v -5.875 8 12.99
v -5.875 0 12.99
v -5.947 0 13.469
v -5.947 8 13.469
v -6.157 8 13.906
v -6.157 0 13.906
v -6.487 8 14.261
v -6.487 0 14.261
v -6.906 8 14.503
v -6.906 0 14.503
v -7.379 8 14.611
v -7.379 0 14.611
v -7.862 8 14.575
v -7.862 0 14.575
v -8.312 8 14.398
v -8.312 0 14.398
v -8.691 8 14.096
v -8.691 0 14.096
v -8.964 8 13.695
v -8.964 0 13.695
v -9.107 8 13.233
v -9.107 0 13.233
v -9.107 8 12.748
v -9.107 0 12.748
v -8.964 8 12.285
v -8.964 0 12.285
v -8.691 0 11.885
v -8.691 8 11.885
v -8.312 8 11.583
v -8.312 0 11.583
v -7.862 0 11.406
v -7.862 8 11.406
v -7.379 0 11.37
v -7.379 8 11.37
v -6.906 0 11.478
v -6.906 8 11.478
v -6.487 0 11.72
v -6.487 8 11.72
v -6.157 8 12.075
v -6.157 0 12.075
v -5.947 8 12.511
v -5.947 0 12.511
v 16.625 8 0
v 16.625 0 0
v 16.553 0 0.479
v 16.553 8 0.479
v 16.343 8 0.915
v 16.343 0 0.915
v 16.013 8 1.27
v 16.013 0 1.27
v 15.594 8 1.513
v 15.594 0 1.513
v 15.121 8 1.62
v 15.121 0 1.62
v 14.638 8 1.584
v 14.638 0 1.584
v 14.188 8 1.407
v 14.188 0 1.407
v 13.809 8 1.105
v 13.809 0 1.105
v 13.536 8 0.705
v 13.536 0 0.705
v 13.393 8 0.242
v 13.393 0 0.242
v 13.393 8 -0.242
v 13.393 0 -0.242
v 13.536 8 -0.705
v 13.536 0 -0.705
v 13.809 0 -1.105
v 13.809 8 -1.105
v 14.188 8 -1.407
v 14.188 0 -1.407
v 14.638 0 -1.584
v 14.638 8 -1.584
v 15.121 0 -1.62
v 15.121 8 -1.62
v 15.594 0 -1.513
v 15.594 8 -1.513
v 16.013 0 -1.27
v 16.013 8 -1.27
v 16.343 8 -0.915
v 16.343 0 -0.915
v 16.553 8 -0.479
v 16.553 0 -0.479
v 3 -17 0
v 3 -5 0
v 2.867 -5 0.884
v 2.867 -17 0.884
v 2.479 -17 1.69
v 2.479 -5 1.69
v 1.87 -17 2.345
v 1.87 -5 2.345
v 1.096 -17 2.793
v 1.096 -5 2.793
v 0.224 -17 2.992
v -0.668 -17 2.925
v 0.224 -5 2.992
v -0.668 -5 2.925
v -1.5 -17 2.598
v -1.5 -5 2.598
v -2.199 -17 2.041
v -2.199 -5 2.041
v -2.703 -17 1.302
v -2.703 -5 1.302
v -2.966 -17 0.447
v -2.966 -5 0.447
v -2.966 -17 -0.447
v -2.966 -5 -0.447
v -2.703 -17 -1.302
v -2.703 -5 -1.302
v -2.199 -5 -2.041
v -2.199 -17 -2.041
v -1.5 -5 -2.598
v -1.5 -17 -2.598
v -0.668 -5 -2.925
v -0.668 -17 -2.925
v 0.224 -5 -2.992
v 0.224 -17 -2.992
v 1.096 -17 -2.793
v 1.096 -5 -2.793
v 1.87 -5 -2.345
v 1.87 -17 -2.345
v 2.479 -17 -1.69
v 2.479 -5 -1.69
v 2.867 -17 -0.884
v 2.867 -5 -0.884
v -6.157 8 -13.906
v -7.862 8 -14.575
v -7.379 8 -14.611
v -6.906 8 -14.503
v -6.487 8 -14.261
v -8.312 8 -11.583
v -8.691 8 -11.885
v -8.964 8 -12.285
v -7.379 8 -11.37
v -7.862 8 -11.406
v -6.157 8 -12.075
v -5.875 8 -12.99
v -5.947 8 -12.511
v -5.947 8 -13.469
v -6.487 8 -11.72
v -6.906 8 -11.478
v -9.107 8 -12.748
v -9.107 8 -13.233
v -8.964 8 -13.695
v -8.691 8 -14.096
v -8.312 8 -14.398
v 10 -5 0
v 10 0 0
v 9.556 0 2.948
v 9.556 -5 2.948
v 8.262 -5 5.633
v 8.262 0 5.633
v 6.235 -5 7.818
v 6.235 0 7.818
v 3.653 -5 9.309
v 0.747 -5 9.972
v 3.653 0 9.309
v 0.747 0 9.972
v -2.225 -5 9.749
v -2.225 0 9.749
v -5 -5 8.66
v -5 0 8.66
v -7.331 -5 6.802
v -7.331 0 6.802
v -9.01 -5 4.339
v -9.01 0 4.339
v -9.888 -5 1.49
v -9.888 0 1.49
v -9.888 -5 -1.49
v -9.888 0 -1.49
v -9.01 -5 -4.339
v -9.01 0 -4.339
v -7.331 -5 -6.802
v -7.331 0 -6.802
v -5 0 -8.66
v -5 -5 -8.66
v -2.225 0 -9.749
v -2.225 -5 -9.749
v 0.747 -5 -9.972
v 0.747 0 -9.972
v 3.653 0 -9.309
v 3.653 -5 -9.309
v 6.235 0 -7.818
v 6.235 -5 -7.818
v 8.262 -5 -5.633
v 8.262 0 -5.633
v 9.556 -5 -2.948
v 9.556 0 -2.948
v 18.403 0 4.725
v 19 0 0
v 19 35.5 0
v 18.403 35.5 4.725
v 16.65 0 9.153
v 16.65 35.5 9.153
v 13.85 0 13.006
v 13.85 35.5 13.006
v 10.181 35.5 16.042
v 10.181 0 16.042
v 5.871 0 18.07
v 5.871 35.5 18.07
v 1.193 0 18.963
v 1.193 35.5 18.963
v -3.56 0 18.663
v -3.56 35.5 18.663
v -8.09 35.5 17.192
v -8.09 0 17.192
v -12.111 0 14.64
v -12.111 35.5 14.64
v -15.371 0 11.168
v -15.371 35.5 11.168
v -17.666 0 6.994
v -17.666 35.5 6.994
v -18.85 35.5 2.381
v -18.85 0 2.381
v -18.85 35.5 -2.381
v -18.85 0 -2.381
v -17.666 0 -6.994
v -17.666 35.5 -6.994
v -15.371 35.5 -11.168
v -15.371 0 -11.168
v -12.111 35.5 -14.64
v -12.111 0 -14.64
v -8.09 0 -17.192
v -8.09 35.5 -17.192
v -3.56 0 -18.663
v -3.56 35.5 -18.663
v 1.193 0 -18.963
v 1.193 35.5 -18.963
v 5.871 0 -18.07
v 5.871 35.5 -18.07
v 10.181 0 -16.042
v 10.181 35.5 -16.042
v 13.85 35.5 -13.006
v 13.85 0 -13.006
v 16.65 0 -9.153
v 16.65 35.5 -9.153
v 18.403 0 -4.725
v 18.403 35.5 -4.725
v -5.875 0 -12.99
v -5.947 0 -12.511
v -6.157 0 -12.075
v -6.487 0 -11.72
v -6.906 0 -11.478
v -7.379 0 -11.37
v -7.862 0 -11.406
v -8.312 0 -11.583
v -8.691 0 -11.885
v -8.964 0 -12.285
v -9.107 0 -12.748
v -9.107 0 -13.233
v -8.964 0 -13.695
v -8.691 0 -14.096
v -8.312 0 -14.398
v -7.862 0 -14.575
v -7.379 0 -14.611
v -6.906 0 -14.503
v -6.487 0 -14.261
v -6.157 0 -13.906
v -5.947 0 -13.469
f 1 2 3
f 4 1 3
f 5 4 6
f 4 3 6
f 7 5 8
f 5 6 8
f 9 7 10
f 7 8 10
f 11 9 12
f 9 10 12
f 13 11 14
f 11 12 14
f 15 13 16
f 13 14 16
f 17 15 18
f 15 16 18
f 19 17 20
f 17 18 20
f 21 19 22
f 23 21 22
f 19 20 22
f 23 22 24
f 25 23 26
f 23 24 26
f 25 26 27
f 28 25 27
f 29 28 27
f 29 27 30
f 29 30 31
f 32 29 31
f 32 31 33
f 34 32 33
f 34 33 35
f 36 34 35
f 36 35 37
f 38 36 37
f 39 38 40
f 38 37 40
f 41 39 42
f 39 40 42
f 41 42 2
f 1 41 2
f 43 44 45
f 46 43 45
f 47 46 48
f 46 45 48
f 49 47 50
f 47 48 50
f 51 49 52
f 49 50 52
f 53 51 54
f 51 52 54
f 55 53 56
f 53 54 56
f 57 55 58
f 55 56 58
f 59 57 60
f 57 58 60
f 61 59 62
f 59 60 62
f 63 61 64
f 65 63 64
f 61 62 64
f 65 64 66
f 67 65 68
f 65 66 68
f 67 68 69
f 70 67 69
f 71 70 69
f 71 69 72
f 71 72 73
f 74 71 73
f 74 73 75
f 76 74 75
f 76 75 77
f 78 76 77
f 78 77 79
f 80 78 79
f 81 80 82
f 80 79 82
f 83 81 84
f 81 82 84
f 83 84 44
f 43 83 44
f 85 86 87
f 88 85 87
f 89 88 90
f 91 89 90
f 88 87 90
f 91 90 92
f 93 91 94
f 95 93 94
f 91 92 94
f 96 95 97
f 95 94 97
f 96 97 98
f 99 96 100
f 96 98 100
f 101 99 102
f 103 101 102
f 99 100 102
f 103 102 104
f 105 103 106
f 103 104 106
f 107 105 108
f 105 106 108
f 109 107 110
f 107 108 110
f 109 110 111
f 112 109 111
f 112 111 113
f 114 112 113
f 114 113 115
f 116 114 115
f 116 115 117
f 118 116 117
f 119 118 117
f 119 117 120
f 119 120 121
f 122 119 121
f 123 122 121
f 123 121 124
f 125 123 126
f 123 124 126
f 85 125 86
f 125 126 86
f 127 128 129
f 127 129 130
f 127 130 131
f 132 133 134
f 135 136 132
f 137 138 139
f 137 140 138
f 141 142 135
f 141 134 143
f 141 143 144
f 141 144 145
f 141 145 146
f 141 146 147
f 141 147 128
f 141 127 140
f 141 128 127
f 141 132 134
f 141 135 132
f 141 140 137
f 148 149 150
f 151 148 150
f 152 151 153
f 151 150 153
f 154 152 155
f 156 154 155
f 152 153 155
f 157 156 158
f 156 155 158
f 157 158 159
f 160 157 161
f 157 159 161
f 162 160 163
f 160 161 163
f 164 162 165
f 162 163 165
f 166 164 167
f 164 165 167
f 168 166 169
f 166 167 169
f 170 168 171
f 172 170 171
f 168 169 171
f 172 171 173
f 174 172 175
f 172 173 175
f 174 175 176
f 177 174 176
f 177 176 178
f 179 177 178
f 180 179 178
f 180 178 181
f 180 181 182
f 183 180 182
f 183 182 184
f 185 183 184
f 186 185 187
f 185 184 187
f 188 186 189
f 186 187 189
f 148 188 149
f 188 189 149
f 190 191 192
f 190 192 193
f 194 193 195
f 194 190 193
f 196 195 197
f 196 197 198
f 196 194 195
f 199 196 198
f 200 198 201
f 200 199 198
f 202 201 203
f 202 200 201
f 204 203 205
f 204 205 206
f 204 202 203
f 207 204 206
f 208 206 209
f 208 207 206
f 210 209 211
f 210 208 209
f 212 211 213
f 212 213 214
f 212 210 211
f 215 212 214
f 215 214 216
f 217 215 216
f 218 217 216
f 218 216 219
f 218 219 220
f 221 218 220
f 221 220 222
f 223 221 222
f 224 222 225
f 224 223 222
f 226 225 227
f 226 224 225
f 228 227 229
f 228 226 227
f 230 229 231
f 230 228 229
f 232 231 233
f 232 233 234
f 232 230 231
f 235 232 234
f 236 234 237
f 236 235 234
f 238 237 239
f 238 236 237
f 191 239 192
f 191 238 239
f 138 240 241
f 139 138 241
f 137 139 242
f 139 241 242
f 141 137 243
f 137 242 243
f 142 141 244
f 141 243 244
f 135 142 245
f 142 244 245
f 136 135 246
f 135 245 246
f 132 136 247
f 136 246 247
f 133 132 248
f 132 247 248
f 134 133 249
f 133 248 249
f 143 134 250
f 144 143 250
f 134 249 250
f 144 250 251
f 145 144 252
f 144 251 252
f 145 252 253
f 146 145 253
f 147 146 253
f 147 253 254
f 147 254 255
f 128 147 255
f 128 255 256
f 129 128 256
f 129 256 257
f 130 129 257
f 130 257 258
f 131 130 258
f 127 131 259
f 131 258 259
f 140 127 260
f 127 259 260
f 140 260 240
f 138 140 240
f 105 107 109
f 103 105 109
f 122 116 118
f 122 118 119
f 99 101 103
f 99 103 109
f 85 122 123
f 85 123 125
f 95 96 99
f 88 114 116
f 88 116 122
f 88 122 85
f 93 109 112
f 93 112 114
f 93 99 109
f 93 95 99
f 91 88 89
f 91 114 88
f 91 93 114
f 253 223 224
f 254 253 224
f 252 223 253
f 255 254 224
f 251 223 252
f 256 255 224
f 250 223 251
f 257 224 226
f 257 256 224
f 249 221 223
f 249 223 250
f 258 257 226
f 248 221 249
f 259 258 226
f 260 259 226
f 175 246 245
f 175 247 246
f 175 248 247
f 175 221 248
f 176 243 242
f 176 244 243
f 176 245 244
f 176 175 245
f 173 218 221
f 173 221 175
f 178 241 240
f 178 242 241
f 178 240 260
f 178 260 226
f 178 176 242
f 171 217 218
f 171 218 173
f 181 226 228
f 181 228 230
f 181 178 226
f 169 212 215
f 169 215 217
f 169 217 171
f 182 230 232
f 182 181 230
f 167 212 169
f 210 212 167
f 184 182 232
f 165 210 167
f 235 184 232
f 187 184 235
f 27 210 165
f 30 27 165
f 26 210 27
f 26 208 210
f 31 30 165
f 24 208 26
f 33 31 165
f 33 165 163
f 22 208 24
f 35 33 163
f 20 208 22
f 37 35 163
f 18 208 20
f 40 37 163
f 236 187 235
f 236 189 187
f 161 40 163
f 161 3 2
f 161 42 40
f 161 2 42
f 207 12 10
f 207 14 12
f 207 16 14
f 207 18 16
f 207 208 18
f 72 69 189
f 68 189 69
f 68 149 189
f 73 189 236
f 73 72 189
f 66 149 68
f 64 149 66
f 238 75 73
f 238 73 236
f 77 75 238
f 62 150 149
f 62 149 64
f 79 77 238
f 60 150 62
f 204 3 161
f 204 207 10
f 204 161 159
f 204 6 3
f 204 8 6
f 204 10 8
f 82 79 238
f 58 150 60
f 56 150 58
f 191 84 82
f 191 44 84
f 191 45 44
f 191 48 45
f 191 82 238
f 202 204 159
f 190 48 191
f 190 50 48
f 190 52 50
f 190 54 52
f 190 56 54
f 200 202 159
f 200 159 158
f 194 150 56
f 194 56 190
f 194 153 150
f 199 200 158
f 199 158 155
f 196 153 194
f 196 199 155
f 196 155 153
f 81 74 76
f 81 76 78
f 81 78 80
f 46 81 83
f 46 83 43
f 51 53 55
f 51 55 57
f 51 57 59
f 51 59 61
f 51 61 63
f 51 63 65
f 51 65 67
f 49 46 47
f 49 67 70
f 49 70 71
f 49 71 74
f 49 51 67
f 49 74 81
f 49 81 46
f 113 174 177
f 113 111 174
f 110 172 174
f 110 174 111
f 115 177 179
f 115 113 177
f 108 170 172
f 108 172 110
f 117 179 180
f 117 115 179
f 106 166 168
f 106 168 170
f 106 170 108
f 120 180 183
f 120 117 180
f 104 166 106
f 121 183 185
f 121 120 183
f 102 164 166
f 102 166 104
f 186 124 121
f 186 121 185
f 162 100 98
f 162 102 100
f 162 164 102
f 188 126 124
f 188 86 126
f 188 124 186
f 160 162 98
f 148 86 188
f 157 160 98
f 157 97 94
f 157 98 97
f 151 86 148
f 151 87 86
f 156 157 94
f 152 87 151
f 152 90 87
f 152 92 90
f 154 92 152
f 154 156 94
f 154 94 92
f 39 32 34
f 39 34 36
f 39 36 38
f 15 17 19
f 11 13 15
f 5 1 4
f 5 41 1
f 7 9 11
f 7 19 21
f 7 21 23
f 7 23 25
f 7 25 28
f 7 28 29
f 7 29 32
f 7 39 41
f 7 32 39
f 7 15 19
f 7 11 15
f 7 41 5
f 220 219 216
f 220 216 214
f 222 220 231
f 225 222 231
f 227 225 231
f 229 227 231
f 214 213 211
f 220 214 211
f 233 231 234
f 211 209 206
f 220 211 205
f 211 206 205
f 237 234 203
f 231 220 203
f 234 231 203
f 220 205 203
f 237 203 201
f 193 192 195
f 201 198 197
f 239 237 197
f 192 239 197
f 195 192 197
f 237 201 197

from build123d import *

# Parameters (mm, degrees)
F1_R     = 19
F2_DEPTH = 35.5
F0_R     = 1.625
F3_DEPTH = 8
F4_R     = 10
F5_DEPTH = 5
F6_R     = 3
F7_DEPTH = 12


with BuildPart() as f2:
    # F1 (on Front) → F2 (new body)
    with BuildSketch(Plane.XZ):
        Circle(F1_R)
    extrude(amount=-F2_DEPTH)

    # F0 (on Front) → F3 (cut)
    with BuildSketch(Plane.XZ):
        with Locations((15, 0)):
            Circle(F0_R)
        with Locations((-7.5, 12.990381)):
            Circle(F0_R)
        with Locations((-7.5, -12.990381)):
            Circle(F0_R)
    extrude(amount=-F3_DEPTH, mode=Mode.SUBTRACT)

    # F4 (on face) → F5 (join)
    with BuildSketch(Plane.XZ):
        Circle(F4_R)
    extrude(amount=F5_DEPTH)

    # F6 (on face) → F7 (join)
    with BuildSketch(Plane.XZ.offset(5)):
        Circle(F6_R)
    extrude(amount=F7_DEPTH)


solid = f2.part
